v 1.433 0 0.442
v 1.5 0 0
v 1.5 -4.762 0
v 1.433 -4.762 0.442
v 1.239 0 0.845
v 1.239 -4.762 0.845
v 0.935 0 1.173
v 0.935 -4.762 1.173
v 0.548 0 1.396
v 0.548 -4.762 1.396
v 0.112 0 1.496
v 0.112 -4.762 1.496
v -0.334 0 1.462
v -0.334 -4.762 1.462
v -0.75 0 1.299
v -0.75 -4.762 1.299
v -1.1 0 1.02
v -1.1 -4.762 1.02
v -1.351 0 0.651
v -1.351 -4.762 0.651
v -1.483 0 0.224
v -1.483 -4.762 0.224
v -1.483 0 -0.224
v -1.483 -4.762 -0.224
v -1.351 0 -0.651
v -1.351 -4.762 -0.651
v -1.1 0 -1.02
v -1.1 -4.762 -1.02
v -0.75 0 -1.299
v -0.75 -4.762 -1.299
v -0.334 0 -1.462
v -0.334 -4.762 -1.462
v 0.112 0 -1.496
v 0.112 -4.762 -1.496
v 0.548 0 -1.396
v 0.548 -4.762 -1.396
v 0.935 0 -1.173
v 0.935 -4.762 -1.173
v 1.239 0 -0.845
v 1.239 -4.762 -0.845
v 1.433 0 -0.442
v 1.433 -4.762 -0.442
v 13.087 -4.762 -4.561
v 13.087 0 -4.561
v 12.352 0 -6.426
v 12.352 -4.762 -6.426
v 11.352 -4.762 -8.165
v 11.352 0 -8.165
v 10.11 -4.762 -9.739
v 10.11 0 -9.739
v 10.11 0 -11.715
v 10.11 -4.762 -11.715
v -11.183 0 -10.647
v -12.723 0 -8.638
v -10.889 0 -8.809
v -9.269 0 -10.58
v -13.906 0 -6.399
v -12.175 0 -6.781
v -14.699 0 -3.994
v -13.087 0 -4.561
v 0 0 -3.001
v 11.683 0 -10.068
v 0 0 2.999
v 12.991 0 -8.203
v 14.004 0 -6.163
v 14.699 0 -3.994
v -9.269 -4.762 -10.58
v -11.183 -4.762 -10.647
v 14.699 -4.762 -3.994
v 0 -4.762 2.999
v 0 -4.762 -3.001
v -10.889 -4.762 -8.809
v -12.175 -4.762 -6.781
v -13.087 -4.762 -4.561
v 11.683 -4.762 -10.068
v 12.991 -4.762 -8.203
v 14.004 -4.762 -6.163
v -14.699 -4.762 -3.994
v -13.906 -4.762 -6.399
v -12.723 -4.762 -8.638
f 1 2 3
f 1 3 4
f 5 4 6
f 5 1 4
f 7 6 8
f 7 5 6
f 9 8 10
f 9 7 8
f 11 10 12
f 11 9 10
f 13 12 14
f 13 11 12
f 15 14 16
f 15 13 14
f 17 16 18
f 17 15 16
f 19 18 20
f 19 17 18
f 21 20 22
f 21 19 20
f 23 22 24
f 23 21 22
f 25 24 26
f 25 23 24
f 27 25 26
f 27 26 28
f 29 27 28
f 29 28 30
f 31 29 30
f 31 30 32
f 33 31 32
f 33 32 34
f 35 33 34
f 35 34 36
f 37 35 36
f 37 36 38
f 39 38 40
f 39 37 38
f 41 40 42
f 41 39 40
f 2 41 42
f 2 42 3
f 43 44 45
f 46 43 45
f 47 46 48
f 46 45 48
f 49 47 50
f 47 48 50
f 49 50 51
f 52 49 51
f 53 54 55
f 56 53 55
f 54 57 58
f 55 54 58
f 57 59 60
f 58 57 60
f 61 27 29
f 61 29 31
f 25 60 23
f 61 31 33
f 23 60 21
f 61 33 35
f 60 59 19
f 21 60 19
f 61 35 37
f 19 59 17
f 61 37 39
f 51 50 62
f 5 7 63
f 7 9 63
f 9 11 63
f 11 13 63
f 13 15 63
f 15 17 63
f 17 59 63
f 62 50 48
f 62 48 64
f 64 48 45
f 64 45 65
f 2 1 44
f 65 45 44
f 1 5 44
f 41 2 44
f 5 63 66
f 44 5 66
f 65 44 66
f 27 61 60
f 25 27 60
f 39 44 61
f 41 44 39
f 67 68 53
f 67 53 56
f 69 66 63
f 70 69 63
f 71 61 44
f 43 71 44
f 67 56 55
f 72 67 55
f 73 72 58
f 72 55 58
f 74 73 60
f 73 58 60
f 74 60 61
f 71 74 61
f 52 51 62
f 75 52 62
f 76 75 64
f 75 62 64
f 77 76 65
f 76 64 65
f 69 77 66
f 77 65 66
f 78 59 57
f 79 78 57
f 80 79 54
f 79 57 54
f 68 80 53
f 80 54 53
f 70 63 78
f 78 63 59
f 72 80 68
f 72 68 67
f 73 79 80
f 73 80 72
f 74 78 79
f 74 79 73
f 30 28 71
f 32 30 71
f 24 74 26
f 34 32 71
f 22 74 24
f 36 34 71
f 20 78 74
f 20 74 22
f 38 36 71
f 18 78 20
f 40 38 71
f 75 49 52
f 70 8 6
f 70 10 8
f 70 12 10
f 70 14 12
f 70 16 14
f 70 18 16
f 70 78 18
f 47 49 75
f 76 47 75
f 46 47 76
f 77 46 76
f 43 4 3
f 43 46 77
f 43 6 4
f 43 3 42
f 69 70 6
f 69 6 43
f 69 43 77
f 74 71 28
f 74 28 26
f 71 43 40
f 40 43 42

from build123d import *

# Parameters (mm, degrees)
F0_R     = 1.5
F1_DEPTH = 4.7625


with BuildPart() as f1:
    # F0 (on Front) → F1 (new body)
    with BuildSketch(Plane.XZ):
        with BuildLine():
            Line((10.109961, -9.738645), (10.109961, -11.715053))
            ThreePointArc((10.109961, -11.715053), (12.991369, -8.203415), (14.699125, -3.994177))
            Line((14.699125, -3.994177), (0, 2.9986))
            Line((0, 2.9986), (-14.699125, -3.994177))
            ThreePointArc((-14.699125, -3.994177), (-13.361828, -7.543024), (-11.183127, -10.647207))
            Line((-11.183127, -10.647207), (-9.269246, -10.580372))
            ThreePointArc((-9.269246, -10.580372), (-11.57614, -7.823081), (-13.086808, -4.560827))
            Line((-13.086808, -4.560827), (0, -3.0014))
            Line((0, -3.0014), (13.086808, -4.560827))
            ThreePointArc((13.086808, -4.560827), (11.883812, -7.313834), (10.109961, -9.738645))
        make_face()
        Circle(F0_R, mode=Mode.SUBTRACT)
    extrude(amount=F1_DEPTH)


solid = f1.part
